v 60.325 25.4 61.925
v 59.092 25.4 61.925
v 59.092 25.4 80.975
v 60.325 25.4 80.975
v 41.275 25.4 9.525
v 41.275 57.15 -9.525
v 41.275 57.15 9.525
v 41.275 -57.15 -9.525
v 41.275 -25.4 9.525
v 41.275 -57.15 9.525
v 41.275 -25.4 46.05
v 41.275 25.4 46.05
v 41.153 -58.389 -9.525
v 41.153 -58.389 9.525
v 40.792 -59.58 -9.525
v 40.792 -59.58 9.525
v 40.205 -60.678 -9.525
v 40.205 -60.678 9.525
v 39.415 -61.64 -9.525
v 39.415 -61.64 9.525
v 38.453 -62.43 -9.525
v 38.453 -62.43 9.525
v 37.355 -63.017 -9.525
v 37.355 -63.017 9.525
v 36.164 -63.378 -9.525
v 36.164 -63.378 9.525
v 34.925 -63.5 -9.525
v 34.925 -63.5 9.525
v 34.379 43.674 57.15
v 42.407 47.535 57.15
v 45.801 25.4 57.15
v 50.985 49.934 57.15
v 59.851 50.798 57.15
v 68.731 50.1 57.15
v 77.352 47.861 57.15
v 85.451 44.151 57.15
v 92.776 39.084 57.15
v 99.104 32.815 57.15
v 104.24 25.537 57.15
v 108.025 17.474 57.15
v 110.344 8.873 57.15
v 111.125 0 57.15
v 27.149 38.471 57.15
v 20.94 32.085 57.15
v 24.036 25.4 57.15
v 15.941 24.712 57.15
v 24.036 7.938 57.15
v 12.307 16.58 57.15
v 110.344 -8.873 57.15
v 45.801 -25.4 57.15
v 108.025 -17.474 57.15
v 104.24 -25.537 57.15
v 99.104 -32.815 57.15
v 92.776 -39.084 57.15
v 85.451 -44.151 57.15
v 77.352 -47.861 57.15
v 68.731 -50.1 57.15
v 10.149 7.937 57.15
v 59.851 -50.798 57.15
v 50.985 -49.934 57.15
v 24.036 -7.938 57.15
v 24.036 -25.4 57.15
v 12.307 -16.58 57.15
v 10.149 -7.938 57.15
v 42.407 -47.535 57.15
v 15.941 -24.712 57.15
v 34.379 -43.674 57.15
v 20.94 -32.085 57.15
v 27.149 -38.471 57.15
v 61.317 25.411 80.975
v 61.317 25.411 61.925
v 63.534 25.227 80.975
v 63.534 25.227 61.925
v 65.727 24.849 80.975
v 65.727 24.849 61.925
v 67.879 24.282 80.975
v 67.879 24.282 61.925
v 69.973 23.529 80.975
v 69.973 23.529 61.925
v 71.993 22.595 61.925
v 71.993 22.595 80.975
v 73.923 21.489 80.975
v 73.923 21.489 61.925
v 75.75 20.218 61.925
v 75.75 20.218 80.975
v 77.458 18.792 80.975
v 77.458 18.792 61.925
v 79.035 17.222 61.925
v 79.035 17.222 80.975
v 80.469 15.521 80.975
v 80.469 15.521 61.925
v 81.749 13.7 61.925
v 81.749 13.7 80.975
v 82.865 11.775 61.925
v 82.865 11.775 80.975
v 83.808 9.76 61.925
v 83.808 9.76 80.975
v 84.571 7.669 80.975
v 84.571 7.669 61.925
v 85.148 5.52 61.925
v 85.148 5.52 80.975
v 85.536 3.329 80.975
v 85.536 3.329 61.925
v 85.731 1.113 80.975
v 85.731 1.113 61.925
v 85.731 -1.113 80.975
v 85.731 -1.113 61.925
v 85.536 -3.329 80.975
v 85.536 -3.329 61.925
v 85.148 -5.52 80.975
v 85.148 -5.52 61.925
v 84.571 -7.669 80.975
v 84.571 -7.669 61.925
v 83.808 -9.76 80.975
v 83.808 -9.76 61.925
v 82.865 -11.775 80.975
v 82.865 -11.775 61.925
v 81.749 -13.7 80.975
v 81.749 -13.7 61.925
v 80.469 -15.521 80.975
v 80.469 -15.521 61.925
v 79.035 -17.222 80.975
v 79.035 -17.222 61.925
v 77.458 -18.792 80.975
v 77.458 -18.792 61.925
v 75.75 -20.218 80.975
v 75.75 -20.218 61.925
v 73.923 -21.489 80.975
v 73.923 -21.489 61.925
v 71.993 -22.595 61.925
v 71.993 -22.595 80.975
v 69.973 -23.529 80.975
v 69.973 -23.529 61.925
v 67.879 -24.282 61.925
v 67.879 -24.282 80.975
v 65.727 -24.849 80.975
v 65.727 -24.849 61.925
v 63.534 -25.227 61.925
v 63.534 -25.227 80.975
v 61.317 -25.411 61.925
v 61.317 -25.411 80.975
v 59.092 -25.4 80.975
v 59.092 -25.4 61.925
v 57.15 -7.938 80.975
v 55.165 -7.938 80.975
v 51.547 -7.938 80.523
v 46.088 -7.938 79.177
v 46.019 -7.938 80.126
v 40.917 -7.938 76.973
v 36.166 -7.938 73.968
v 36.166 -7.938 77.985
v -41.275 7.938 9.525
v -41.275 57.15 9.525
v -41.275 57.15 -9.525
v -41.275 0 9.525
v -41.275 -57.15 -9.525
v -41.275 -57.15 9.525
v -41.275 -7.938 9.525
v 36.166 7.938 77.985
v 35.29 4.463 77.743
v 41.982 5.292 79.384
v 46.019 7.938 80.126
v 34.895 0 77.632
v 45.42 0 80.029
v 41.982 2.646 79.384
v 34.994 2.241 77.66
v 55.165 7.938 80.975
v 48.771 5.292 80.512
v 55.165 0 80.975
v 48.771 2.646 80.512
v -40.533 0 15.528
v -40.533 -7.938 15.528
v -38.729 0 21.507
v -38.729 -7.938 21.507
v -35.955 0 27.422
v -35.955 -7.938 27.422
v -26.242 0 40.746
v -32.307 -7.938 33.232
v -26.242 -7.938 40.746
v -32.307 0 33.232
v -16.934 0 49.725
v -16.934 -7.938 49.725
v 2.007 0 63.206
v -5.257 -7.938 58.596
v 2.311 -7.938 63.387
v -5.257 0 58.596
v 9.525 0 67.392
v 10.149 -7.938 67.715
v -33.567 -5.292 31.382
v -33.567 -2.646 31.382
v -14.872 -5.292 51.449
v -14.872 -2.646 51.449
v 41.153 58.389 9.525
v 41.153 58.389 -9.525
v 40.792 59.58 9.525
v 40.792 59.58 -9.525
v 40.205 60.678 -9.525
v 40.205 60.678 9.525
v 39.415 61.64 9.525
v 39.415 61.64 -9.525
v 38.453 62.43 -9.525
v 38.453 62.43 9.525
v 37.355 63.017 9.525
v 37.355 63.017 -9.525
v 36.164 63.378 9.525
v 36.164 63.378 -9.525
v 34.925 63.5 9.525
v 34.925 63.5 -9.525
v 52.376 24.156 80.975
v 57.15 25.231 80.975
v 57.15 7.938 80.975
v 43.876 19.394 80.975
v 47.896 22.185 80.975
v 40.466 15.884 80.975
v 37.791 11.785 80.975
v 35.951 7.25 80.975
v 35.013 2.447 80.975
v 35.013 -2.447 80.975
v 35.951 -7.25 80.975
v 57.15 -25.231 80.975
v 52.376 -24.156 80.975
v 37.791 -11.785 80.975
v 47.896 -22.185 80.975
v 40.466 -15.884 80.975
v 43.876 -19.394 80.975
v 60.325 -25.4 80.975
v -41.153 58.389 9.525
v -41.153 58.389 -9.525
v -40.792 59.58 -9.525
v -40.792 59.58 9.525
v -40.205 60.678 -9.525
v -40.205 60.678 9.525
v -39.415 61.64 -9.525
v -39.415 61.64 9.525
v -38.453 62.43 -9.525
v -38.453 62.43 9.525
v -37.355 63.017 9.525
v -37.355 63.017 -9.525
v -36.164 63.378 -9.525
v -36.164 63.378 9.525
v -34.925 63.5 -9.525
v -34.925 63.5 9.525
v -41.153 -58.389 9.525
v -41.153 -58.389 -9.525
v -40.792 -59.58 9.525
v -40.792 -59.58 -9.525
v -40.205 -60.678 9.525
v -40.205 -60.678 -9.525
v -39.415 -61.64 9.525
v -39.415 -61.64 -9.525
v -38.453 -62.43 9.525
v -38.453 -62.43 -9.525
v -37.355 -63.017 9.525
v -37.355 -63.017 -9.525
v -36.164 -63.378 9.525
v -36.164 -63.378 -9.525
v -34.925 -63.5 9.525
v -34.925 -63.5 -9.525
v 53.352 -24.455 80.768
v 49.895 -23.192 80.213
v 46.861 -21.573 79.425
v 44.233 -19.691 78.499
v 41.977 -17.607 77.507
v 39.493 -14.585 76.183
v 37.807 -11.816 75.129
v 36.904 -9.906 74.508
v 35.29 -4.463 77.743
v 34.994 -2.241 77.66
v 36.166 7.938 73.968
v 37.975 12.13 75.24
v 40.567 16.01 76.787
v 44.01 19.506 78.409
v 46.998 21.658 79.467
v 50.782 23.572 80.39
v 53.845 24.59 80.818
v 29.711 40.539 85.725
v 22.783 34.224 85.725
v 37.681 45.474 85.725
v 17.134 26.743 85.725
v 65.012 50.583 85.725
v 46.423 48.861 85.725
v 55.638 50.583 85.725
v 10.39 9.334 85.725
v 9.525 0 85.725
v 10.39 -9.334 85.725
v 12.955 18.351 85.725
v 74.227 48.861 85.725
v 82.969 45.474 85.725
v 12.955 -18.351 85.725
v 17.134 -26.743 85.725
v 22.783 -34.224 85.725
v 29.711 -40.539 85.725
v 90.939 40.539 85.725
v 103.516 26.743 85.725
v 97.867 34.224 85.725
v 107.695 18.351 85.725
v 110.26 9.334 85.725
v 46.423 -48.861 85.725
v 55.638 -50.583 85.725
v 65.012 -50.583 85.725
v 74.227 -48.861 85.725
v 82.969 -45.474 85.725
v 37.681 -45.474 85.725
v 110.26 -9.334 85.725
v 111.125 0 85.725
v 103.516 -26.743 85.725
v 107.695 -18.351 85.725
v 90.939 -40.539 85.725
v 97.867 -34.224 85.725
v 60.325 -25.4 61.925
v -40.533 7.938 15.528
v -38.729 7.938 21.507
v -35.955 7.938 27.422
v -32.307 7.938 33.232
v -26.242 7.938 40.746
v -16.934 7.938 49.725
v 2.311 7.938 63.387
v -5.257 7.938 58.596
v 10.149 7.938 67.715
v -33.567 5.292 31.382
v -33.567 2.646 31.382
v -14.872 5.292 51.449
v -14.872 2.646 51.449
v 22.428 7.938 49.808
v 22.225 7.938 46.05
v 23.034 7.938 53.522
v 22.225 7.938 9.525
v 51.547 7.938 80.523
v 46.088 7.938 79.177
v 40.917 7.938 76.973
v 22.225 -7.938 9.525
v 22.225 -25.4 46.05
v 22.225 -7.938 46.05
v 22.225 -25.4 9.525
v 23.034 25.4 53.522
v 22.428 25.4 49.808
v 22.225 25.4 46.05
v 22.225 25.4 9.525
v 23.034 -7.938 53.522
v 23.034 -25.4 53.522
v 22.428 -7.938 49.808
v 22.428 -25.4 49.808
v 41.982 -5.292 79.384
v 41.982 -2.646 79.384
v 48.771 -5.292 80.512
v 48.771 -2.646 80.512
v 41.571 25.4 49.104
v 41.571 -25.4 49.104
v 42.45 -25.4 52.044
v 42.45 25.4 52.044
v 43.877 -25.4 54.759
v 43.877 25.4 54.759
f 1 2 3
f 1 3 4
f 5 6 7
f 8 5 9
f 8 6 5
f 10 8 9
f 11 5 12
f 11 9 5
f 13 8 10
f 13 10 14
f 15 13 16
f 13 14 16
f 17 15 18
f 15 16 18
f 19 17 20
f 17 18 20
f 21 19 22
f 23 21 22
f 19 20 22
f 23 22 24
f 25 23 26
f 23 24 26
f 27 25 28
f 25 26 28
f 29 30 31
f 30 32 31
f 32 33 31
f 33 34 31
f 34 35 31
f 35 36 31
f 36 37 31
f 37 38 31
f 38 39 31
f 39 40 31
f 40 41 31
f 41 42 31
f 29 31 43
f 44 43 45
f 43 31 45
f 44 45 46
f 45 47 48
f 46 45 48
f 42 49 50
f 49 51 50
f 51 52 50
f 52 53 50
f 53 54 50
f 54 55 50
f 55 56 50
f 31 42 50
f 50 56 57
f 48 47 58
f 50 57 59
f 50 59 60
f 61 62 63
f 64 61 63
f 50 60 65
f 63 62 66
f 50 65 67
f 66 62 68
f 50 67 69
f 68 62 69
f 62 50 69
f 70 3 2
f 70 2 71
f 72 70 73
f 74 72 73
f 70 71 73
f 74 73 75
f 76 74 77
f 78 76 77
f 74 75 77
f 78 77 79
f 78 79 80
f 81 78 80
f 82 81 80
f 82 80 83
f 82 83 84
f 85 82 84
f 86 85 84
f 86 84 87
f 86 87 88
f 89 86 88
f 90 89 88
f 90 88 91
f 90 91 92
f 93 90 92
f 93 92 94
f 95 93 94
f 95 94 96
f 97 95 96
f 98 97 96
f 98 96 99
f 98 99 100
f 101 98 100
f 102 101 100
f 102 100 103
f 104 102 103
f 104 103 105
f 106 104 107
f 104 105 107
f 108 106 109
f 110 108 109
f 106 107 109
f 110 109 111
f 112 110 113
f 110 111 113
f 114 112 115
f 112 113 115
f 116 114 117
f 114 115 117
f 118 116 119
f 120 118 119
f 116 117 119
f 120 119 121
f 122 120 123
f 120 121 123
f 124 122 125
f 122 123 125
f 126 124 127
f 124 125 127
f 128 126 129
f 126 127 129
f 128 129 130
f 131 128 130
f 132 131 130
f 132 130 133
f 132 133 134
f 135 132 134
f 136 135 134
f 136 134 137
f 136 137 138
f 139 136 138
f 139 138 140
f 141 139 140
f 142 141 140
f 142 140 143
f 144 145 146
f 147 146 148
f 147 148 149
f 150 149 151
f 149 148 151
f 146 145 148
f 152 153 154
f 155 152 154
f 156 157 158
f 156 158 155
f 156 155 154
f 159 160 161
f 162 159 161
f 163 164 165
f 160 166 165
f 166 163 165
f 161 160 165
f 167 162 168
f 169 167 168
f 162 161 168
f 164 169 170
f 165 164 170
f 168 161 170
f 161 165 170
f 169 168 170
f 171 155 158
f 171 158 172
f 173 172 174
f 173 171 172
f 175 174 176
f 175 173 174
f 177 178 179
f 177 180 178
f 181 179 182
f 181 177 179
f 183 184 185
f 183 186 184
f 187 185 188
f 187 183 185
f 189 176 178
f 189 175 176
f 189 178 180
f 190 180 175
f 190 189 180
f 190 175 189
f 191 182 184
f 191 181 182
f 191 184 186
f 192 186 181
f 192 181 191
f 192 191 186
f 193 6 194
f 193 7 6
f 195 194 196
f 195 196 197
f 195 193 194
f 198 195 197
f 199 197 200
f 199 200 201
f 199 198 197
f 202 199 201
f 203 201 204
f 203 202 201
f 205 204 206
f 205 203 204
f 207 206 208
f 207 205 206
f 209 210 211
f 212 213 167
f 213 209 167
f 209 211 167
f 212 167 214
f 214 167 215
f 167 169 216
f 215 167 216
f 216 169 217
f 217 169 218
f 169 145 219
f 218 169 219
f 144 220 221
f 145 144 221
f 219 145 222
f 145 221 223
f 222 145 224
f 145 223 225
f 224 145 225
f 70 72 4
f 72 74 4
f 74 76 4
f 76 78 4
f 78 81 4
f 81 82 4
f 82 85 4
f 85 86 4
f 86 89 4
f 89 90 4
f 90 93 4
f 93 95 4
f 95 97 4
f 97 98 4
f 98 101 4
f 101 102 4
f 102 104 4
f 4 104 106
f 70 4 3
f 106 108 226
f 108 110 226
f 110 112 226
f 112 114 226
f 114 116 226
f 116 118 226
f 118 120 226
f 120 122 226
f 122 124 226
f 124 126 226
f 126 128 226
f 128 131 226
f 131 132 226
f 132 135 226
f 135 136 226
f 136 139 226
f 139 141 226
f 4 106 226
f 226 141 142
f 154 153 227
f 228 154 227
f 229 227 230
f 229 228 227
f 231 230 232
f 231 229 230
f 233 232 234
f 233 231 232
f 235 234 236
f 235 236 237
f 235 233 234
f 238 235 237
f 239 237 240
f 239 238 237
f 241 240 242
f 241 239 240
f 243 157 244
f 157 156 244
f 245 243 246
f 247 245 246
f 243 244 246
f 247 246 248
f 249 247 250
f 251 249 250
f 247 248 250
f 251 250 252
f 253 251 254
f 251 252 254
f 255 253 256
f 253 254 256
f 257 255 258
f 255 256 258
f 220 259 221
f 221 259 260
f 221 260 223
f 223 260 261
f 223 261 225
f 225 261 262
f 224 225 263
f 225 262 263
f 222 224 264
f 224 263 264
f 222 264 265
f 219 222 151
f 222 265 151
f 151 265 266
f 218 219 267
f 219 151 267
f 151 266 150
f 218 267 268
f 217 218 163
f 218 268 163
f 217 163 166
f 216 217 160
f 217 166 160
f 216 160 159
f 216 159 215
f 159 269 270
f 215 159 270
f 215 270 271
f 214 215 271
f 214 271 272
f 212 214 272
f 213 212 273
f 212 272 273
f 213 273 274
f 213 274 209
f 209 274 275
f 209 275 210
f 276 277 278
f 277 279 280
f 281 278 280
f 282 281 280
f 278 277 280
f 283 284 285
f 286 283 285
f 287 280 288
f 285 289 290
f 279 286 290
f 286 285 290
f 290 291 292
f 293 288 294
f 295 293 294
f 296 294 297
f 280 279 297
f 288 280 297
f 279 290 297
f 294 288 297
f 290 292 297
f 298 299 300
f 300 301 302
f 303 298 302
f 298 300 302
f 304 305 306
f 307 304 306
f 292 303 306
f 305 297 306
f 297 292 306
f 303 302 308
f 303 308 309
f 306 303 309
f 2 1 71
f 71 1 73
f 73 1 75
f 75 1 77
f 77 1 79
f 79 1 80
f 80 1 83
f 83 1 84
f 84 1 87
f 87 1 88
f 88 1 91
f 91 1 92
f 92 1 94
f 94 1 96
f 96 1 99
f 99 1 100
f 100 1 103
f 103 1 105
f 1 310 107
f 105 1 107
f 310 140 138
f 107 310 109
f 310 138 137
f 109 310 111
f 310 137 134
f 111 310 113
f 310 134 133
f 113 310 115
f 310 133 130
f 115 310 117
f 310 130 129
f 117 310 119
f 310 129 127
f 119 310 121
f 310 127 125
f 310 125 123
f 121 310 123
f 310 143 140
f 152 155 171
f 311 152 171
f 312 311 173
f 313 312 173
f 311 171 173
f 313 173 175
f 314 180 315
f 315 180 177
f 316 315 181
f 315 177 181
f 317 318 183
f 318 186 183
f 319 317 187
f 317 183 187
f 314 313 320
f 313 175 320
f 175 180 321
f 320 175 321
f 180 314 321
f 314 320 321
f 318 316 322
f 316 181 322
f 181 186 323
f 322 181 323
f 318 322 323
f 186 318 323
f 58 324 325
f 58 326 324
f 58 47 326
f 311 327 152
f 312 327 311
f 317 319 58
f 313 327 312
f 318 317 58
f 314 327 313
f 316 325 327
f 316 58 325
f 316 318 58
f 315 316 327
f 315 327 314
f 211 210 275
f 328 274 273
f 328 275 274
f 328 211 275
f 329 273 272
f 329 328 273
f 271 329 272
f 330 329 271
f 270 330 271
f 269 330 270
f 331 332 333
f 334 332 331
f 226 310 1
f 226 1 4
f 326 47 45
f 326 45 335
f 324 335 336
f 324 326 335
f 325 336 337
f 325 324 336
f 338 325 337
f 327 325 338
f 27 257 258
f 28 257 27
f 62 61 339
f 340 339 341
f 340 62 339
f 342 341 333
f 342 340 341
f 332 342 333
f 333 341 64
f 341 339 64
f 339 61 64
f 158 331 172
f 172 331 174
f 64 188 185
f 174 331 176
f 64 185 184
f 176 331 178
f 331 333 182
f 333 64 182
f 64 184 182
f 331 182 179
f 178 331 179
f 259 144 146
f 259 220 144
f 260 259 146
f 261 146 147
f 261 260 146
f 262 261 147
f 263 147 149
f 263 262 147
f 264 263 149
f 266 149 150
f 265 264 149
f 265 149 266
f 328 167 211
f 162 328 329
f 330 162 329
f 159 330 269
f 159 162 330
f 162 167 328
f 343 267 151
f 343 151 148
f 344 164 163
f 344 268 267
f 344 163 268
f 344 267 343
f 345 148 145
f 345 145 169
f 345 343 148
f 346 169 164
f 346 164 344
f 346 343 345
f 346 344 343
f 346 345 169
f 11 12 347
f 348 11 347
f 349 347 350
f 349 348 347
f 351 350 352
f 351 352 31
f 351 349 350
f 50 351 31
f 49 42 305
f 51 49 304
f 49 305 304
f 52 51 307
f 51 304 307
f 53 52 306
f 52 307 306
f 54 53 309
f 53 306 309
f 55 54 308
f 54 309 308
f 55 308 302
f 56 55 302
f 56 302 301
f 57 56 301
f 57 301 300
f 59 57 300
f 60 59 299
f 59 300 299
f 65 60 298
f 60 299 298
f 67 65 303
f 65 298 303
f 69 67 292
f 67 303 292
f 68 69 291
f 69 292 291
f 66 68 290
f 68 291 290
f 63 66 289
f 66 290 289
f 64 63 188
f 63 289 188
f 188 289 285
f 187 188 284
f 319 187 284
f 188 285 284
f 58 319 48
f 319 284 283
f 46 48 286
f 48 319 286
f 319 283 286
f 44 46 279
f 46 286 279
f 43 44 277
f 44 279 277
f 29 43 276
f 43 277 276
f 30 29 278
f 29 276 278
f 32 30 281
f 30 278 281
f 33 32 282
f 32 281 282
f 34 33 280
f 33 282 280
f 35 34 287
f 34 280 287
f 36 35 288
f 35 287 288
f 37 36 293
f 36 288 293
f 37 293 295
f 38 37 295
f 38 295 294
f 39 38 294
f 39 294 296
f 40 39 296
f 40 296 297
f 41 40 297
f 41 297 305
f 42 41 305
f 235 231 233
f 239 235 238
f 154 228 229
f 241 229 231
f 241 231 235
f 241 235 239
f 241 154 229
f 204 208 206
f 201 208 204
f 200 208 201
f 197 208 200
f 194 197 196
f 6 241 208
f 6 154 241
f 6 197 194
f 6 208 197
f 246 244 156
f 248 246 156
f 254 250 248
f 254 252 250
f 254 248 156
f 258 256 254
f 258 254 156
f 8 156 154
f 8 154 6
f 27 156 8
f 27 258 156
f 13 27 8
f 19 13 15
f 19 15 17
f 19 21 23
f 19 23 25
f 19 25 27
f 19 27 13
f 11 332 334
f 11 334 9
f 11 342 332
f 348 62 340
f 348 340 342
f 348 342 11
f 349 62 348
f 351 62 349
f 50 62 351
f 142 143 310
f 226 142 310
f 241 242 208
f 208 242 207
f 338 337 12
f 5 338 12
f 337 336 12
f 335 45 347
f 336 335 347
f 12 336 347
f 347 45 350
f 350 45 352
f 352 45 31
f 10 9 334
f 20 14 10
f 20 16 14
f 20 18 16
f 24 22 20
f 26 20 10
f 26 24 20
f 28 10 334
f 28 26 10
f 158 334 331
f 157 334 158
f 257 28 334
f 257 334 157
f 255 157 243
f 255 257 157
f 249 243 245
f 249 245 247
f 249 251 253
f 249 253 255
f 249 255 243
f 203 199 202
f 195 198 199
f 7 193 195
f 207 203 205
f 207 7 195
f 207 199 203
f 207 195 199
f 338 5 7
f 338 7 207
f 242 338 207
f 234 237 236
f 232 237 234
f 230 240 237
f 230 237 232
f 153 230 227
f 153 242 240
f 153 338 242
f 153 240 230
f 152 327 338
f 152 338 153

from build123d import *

# Parameters (mm, degrees)
F1_DEPTH = 63.5
F2_DEPTH = 7.9375
F3_DEPTH = 25.4
F5_R     = 6.35


with BuildPart() as f1:
    # F0 (on Front) → F1 (new body, symmetric)
    with BuildSketch(Plane.XZ):
        Polygon((-41.275, 9.525), (-41.275, -9.525), (41.275, -9.525), (41.275, 9.525), (22.225, 9.525), align=None)
    extrude(amount=F1_DEPTH, both=True)

    # F0 (on Front) → F2 (join, symmetric)
    with BuildSketch(Plane.XZ):
        with BuildLine():
            add(Edge.make_bspline(
                [(-41.275, 9.525), (-40.209185, 45.154918), (21.977982, 81.660934), (57.15, 80.9752)],
                knots=[0, 0, 0, 0, 121.624881, 121.624881, 121.624881, 121.624881], degree=3))
            Line((-41.275, 9.525), (22.225, 9.525))
            Line((22.225, 9.525), (22.225, 46.0502))
            ThreePointArc((22.225, 46.0502), (32.454296, 70.745904), (57.15, 80.9752))
        make_face()
    extrude(amount=F2_DEPTH, both=True)

    # F0 (on Front) → F3 (join, symmetric)
    with BuildSketch(Plane.XZ):
        with BuildLine():
            Line((22.225, 9.525), (41.275, 9.525))
            Line((41.275, 9.525), (41.275, 46.0502))
            ThreePointArc((41.275, 46.0502), (45.92468, 57.27552), (57.15, 61.9252))
            Line((57.15, 61.9252), (60.325, 61.9252))
            Line((60.325, 61.9252), (60.325, 80.9752))
            Line((60.325, 80.9752), (57.15, 80.9752))
            ThreePointArc((57.15, 80.9752), (32.454296, 70.745904), (22.225, 46.0502))
            Line((22.225, 46.0502), (22.225, 9.525))
        make_face()
    extrude(amount=F3_DEPTH, both=True)

    # F0 (on Front) → F4 (revolve)
    with BuildSketch(Plane.XZ):
        Polygon((60.325, 85.725), (60.325, 80.9752), (85.754924, 80.9752), (85.754924, 61.9252), (60.325, 61.9252), (60.325, 57.15), (111.125, 57.15), (111.125, 85.725), align=None)
    revolve(axis=Axis((60.325, 0, 71.4375), (0, 0, -1)))

    # F5
    f5_edges = [f1.edges().sort_by_distance(p)[0] for p in [
        (41.275, -63.5, 0),
        (-41.275, -63.5, 0),
        (41.275, 63.5, 0),
        (-41.275, 63.5, 0),
    ]]
    fillet(f5_edges, radius=F5_R)


solid = f1.part
